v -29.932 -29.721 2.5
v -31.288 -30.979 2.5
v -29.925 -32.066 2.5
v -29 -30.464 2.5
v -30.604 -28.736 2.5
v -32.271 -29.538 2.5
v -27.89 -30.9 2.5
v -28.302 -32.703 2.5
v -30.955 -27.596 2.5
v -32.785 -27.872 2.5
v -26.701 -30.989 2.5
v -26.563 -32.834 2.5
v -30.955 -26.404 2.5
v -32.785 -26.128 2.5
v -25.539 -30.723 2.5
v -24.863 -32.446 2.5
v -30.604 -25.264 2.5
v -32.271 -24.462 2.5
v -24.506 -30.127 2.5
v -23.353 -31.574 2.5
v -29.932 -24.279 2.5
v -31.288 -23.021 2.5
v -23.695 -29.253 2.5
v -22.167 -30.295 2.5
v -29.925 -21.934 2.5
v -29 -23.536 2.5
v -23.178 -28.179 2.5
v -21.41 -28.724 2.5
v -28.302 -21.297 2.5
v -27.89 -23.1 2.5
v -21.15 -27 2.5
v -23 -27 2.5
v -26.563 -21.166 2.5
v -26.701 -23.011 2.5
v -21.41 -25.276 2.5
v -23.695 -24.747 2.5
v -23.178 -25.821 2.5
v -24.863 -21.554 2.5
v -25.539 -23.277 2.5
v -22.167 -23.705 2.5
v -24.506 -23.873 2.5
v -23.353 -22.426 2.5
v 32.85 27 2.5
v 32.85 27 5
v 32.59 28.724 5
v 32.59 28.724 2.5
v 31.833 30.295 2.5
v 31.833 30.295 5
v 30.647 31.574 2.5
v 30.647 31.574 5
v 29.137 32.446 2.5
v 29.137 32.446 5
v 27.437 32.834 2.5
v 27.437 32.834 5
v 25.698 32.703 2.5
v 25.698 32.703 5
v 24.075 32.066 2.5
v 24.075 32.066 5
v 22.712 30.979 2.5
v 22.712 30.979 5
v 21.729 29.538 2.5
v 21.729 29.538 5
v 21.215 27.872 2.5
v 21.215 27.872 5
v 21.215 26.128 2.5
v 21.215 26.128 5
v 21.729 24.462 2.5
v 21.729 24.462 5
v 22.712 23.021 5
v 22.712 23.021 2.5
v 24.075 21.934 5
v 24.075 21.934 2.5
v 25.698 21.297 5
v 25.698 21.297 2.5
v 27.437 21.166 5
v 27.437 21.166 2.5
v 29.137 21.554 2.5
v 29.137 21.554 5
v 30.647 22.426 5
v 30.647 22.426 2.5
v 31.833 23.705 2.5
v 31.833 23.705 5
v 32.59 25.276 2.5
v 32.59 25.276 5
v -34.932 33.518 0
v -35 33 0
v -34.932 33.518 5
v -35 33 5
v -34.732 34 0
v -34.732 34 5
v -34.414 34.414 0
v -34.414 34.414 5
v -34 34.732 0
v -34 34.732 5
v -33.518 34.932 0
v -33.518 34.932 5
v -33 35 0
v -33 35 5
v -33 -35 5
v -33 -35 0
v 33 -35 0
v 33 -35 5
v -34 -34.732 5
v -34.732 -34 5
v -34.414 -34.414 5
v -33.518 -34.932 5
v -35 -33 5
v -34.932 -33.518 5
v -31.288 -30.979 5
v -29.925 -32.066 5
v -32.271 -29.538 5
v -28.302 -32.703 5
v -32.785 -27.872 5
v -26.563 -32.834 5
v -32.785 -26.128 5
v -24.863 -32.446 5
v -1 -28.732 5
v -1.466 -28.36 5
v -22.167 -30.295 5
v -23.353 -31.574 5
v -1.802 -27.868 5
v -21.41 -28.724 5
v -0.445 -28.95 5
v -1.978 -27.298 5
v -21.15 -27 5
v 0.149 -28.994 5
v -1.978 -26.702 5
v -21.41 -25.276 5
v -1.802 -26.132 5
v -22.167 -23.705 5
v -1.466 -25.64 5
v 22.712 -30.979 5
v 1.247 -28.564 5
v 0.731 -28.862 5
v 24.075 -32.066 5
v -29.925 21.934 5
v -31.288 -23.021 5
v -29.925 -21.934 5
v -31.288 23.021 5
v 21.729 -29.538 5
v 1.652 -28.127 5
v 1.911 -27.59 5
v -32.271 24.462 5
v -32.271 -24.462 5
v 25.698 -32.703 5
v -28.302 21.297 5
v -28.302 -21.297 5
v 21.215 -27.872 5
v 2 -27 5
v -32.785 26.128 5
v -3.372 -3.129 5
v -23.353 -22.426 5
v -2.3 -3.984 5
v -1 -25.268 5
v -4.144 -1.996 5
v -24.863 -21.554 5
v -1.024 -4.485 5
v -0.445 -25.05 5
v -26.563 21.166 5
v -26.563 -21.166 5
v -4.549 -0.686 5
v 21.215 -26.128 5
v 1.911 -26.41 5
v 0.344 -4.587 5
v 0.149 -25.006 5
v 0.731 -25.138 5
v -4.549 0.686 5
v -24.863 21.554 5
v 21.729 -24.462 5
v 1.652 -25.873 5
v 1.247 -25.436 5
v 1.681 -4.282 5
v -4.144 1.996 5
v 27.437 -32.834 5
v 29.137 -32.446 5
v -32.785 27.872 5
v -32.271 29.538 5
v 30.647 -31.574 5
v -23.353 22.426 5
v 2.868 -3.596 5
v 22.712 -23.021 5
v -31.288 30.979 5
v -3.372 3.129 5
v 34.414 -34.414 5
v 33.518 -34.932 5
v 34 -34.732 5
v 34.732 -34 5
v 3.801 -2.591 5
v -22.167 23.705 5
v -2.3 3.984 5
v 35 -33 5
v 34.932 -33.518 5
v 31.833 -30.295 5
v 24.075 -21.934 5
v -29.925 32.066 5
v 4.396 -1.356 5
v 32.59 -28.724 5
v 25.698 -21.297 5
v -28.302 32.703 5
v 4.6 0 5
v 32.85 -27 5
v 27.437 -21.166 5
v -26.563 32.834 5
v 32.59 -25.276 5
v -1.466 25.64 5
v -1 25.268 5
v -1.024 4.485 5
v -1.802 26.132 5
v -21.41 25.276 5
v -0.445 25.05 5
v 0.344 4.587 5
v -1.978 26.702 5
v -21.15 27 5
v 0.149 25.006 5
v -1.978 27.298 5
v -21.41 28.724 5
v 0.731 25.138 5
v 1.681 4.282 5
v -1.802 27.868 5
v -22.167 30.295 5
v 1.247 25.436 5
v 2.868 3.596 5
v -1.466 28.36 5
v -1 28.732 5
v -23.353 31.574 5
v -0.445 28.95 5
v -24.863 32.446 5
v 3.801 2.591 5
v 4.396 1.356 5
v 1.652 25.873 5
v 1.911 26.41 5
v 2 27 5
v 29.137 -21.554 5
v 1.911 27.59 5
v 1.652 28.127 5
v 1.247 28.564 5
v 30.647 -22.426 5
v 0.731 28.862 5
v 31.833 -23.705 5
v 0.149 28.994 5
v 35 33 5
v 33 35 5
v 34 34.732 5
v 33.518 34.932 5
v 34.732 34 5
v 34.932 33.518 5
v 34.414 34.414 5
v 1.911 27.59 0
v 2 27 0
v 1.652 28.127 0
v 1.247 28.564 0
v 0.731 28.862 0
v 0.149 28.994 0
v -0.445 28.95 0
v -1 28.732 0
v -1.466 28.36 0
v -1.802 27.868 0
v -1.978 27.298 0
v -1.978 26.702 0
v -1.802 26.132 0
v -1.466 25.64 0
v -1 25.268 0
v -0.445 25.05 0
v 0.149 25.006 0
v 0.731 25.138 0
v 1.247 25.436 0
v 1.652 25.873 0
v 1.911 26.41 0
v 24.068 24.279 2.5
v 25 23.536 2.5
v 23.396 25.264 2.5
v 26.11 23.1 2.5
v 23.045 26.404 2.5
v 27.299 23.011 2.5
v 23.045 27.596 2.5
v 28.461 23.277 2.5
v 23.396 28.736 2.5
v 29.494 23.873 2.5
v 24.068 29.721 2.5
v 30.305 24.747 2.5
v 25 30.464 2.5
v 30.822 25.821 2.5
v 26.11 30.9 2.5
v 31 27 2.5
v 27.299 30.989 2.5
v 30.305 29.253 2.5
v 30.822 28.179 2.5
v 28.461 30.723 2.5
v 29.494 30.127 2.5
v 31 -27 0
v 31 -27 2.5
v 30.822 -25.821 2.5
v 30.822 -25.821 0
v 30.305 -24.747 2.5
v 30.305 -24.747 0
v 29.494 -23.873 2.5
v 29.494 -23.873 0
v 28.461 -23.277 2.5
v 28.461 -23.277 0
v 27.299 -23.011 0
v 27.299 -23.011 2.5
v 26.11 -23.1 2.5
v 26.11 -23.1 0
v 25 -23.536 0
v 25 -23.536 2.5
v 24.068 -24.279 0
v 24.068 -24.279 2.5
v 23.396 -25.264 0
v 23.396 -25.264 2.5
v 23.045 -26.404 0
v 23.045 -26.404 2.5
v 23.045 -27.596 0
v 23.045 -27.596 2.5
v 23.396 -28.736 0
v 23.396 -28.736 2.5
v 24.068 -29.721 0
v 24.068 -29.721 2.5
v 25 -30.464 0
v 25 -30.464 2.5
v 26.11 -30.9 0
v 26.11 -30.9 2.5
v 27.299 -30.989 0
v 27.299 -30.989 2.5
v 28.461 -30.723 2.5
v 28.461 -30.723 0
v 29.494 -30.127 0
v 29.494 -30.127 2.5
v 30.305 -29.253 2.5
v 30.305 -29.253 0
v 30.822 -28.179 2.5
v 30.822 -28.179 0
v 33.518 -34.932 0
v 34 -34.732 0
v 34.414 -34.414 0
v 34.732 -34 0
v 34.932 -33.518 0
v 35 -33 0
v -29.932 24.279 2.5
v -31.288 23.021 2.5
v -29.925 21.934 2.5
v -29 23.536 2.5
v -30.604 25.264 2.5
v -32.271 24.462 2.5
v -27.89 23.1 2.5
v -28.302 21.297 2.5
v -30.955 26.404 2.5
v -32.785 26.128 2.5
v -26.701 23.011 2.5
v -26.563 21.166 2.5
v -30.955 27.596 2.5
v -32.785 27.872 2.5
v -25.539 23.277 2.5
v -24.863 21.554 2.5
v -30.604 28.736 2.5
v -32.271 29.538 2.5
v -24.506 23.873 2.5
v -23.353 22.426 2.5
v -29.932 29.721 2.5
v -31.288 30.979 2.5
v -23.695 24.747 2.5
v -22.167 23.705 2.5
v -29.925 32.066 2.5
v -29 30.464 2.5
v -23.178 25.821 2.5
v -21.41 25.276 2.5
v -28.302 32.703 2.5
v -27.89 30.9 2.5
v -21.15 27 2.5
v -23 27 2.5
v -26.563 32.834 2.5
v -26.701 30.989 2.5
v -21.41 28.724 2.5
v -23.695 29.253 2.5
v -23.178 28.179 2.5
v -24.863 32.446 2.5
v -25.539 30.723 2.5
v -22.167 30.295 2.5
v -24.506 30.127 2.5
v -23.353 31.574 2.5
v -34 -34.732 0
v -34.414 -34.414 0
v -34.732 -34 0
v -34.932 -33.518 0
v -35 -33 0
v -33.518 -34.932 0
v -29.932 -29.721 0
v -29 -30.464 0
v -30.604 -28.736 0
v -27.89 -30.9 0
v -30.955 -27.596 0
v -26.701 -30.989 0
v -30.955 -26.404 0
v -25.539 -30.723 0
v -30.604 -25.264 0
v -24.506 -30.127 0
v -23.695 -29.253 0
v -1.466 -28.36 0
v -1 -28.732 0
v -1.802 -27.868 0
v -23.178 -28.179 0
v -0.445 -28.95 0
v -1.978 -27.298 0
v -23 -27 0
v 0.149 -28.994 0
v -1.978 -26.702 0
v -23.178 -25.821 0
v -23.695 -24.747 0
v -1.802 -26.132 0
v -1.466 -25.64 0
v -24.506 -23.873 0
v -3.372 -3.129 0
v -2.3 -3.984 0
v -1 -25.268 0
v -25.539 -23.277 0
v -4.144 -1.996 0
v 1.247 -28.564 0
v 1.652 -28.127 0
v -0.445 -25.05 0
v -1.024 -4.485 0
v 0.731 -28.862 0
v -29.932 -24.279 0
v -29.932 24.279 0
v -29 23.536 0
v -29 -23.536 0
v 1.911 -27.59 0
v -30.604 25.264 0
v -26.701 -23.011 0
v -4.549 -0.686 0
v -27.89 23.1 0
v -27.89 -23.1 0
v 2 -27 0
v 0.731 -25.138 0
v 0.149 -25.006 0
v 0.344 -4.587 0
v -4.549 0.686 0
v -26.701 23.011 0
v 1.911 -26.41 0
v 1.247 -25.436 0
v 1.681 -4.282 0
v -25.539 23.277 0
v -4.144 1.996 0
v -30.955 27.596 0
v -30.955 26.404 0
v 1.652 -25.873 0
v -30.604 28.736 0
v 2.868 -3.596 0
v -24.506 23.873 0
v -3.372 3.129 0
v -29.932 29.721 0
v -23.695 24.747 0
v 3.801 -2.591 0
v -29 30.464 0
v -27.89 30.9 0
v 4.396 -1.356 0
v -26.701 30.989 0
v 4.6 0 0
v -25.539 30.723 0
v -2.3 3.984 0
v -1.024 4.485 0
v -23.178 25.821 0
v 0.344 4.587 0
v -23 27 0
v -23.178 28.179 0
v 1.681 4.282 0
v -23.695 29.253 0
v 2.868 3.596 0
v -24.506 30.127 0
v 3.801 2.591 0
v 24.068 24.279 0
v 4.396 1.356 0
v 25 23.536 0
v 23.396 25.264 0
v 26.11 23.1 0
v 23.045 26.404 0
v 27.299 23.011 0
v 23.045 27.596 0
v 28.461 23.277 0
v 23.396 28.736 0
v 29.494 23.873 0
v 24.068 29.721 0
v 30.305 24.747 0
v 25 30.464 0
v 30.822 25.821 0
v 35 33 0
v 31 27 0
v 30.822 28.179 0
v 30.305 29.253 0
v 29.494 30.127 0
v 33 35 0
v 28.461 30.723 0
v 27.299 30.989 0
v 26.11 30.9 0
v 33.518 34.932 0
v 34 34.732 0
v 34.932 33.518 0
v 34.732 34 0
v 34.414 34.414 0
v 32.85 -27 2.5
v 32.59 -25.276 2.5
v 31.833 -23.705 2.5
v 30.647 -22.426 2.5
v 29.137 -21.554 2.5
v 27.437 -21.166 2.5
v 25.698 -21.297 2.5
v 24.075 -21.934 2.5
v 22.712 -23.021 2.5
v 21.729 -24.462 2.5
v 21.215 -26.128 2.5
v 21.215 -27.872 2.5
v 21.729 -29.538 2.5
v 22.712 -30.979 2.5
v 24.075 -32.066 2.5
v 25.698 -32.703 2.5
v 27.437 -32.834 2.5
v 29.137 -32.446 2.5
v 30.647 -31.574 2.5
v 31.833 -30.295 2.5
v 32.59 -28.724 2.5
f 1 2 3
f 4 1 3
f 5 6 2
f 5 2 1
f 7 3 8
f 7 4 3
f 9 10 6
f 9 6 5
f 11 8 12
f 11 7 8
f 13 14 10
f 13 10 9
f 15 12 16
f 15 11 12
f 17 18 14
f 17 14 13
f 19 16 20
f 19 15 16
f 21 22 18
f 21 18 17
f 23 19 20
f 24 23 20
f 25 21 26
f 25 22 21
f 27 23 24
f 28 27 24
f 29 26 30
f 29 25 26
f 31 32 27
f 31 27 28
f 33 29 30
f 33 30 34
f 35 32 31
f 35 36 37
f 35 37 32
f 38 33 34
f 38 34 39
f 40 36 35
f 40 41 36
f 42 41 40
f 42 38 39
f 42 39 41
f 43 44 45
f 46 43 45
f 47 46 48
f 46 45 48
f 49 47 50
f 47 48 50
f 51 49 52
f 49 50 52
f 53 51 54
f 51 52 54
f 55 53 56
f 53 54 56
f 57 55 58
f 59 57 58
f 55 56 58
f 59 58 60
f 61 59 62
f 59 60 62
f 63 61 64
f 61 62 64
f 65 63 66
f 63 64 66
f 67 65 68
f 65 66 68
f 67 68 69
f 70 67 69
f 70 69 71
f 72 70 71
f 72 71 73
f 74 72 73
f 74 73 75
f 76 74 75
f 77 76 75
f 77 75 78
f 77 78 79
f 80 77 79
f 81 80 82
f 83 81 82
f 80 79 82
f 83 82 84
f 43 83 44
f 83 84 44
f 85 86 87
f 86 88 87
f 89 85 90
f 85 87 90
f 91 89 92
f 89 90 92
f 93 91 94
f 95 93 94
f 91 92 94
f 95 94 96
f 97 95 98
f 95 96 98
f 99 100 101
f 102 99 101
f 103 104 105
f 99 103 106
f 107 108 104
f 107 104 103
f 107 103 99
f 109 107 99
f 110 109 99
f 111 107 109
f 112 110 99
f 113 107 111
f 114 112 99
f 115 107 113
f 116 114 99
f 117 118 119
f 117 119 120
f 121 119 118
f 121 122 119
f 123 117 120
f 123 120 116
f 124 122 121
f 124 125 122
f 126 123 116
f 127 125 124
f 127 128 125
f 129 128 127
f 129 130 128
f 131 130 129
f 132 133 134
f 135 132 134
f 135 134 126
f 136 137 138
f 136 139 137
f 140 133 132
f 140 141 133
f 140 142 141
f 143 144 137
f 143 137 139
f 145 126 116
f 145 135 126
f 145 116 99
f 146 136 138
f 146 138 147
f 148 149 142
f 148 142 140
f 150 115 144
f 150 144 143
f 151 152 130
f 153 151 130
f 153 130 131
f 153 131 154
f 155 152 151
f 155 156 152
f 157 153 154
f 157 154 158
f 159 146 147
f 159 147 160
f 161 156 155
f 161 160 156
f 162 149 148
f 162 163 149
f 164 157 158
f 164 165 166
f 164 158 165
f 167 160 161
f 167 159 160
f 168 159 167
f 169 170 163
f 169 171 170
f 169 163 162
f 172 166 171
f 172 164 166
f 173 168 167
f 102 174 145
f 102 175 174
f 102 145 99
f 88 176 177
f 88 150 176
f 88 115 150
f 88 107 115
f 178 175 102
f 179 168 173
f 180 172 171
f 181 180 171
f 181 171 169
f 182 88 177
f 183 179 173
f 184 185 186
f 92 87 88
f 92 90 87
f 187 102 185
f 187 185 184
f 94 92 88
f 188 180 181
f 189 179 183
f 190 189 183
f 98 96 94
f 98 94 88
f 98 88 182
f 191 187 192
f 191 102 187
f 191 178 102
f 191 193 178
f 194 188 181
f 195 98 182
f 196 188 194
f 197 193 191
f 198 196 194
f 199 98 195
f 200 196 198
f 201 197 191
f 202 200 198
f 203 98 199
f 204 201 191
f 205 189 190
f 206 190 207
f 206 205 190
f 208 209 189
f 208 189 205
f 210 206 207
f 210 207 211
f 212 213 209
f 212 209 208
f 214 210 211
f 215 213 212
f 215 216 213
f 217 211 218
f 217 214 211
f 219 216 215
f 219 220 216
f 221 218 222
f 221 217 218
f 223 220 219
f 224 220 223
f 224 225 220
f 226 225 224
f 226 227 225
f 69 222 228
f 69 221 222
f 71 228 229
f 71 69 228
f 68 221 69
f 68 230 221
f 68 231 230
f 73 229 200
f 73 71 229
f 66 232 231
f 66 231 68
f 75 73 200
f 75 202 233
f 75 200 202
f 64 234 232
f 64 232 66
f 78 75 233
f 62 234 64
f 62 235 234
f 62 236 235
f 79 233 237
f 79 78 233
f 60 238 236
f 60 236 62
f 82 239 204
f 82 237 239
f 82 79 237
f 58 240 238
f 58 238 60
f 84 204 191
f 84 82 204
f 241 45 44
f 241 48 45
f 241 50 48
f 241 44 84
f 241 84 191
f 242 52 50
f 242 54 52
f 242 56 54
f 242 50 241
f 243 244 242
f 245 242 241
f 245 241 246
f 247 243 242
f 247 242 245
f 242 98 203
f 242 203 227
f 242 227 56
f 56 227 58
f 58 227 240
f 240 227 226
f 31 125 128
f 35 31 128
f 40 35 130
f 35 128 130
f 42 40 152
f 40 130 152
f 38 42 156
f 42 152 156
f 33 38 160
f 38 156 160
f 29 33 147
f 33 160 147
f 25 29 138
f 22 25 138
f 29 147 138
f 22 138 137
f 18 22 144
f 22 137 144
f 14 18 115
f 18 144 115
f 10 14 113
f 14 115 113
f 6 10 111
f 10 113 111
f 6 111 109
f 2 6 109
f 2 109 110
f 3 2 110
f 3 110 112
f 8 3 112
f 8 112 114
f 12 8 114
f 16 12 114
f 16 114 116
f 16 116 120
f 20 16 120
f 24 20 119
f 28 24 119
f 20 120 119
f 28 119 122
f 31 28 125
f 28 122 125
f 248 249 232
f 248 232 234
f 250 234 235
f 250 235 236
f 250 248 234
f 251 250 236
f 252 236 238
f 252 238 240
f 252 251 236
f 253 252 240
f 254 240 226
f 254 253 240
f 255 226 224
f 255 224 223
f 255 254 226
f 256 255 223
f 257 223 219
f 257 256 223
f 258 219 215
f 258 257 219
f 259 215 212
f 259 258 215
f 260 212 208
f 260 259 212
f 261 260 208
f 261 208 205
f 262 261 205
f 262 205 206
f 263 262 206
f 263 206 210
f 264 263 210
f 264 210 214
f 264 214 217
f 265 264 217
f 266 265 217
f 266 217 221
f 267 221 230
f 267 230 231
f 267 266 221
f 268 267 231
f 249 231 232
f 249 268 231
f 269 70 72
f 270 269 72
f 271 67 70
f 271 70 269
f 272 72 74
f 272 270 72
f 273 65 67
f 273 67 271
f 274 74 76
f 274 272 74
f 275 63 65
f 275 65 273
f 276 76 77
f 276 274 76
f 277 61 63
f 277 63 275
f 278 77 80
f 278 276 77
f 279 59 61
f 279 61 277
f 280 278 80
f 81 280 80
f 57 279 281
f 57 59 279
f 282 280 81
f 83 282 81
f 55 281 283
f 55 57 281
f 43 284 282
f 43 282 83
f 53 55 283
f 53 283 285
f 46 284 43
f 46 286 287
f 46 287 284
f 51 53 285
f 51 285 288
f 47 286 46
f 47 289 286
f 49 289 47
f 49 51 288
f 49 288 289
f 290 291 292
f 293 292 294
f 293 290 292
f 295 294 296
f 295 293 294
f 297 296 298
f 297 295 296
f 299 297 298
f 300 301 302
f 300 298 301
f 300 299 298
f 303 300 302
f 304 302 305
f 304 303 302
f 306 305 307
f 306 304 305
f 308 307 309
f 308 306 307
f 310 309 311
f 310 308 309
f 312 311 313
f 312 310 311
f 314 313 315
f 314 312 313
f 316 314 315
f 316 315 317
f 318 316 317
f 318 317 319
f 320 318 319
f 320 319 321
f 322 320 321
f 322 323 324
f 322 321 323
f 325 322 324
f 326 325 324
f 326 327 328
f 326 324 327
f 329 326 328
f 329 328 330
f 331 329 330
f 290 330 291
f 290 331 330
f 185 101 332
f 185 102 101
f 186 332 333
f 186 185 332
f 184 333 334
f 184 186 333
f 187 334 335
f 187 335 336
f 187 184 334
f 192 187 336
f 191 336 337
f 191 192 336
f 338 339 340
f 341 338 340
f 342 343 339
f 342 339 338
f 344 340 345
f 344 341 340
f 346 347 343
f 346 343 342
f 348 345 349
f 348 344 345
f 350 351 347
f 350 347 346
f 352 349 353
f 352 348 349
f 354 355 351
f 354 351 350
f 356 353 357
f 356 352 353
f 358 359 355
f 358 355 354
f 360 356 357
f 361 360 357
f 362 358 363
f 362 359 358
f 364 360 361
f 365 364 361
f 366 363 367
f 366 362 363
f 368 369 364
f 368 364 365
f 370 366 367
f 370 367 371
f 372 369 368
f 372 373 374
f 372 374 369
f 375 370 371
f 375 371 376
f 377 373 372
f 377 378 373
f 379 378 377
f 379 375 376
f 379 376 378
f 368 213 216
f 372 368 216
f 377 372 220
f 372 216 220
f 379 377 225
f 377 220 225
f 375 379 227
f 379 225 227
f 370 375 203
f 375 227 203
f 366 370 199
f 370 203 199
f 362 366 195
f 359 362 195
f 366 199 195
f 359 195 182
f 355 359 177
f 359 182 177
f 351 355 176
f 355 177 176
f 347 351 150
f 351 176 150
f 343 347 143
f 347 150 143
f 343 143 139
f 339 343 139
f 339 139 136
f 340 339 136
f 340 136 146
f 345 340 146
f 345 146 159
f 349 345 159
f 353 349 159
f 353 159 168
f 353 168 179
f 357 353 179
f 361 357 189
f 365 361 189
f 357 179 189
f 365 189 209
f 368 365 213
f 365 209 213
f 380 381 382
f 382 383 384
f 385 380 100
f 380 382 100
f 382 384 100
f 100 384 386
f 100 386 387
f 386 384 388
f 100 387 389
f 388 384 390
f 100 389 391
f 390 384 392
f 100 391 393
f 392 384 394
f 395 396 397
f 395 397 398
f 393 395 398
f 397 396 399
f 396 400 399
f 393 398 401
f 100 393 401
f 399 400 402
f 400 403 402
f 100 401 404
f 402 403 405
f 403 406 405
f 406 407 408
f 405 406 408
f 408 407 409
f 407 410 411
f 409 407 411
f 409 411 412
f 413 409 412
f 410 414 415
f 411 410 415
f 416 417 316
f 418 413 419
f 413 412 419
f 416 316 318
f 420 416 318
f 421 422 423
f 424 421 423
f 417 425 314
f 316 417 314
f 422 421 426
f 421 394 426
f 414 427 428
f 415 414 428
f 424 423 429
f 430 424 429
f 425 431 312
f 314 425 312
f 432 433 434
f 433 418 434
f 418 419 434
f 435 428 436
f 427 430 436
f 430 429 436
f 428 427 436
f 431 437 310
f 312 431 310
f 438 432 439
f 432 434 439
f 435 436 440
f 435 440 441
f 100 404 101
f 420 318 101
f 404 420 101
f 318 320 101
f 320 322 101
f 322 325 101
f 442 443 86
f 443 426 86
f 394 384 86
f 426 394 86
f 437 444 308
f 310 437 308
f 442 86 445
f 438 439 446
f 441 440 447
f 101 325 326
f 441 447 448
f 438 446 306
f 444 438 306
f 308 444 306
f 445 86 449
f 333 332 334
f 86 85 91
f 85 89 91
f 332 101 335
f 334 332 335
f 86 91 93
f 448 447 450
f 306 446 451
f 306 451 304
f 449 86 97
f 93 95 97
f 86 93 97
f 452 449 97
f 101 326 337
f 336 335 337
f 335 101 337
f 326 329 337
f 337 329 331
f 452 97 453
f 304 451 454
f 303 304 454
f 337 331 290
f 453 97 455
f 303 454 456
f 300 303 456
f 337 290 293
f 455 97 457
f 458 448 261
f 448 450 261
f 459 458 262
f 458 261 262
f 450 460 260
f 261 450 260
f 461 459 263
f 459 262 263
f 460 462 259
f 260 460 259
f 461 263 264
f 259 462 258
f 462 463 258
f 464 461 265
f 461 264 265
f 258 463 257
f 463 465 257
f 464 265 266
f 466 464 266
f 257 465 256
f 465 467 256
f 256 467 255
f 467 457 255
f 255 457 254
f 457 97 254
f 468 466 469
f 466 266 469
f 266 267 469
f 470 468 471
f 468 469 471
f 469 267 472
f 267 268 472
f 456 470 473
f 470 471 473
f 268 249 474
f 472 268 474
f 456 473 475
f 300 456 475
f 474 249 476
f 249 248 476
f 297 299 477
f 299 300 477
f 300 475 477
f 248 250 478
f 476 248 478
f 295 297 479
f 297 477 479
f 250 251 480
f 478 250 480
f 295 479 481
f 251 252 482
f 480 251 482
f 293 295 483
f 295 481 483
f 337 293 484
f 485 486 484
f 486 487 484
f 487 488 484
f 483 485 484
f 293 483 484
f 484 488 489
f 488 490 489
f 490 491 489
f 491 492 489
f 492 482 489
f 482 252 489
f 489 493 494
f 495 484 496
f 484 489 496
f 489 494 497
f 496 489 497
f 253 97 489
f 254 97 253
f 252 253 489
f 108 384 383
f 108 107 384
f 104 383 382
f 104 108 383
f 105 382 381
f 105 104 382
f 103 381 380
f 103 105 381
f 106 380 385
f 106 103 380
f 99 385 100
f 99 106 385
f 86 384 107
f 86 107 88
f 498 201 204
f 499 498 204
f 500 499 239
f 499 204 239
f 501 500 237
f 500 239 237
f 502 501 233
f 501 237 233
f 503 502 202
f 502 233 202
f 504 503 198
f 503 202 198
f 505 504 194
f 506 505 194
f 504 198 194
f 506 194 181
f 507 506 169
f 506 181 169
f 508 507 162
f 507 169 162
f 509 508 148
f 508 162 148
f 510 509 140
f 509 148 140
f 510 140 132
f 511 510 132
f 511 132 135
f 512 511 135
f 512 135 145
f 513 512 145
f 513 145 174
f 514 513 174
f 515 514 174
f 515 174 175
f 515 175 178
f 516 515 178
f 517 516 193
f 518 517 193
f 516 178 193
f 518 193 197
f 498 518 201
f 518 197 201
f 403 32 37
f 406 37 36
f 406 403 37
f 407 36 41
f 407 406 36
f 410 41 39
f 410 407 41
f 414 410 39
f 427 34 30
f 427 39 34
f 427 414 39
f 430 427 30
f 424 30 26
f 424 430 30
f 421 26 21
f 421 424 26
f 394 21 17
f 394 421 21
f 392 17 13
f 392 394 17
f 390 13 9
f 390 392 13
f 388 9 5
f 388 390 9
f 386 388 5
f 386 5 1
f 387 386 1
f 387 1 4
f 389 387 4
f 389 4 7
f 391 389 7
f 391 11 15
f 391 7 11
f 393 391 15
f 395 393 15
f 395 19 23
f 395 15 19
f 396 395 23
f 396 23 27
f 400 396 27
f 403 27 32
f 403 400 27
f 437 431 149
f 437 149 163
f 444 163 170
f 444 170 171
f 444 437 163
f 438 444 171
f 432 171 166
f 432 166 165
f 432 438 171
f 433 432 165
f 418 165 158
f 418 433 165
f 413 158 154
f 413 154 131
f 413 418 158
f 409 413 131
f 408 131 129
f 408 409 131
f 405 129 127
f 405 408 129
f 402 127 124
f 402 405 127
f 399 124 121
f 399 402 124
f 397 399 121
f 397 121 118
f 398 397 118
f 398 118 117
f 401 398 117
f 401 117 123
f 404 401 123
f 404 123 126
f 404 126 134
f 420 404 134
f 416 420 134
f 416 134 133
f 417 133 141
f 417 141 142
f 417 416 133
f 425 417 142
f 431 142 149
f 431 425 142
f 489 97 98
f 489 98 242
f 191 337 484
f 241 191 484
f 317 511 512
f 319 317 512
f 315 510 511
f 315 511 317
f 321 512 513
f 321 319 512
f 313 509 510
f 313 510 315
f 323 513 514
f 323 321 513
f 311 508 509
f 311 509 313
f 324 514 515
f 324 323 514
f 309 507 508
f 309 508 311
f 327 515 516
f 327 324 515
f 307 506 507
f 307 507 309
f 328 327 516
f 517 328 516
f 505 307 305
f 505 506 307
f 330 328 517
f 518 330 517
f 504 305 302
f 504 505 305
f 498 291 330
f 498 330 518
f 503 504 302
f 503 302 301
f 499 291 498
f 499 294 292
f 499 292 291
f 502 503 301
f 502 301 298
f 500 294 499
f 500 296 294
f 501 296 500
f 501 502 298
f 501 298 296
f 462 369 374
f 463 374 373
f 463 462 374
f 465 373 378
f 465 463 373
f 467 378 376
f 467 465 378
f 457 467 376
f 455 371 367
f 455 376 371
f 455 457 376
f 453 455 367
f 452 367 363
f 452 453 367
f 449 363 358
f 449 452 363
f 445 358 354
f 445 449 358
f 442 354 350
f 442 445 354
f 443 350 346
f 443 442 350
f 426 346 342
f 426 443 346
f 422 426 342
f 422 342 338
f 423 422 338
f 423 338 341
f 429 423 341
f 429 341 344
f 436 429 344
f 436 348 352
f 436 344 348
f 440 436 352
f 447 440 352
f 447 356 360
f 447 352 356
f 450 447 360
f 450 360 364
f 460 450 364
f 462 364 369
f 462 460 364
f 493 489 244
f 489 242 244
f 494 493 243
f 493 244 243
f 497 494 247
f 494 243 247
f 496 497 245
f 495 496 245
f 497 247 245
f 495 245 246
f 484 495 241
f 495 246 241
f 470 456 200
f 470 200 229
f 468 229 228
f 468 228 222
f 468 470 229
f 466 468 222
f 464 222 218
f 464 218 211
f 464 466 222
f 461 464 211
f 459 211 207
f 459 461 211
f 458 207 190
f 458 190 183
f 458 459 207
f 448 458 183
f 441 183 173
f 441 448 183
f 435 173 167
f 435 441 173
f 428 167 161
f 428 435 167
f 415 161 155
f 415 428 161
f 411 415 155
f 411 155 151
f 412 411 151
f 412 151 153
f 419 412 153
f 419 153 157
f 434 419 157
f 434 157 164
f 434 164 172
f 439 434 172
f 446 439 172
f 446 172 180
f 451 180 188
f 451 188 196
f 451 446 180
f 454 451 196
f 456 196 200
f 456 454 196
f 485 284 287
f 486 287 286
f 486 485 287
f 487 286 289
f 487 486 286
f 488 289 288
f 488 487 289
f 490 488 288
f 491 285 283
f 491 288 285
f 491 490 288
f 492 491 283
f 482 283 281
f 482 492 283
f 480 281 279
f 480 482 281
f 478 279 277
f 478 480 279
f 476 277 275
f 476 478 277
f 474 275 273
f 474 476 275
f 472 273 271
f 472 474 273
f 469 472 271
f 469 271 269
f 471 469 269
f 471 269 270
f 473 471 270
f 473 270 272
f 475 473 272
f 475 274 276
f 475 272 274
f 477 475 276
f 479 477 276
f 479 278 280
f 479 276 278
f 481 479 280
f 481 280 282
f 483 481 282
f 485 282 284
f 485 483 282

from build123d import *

# Parameters (mm, degrees)
SKETCH1_W           = 70
SKETCH1_H           = 70
SKETCH1_R           = 4.6
SKETCH1_R_2         = 2
SKETCH1_R_3         = 4
BOSS_EXTRUDE1_DEPTH = 5
FILLET1_R           = 2
FILLET2_R           = 2
SKETCH2_R           = 5.85
CUT_EXTRUDE1_DEPTH  = 2.5


with BuildPart() as part:
    # Sketch1 → Boss-Extrude1 (new body)
    with BuildSketch(Plane.XY):
        Rectangle(SKETCH1_W, SKETCH1_H)
        Circle(SKETCH1_R, mode=Mode.SUBTRACT)
        with Locations((0, 27)):
            Circle(SKETCH1_R_2, mode=Mode.SUBTRACT)
        with Locations((0, -27)):
            Circle(SKETCH1_R_2, mode=Mode.SUBTRACT)
        with Locations((-27, 27)):
            Circle(SKETCH1_R_3, mode=Mode.SUBTRACT)
        with Locations((27, 27)):
            Circle(SKETCH1_R_3, mode=Mode.SUBTRACT)
        with Locations((27, -27)):
            Circle(SKETCH1_R_3, mode=Mode.SUBTRACT)
        with Locations((-27, -27)):
            Circle(SKETCH1_R_3, mode=Mode.SUBTRACT)
    extrude(amount=BOSS_EXTRUDE1_DEPTH)

    # Fillet1
    fillet1_edges = [part.edges().sort_by_distance(p)[0] for p in [
        (-35, 35, 2.5),
        (35, 35, 2.5),
        (35, -35, 2.5),
    ]]
    fillet(fillet1_edges, radius=FILLET1_R)

    # Fillet2
    fillet2_edges = [part.edges().sort_by_distance(p)[0] for p in [
        (-35, -35, 2.5),
    ]]
    fillet(fillet2_edges, radius=FILLET2_R)

    # Sketch2 → Cut-Extrude1 (cut)
    with BuildSketch(Plane.XY.offset(5)):
        with Locations((-27, 27)):
            Circle(SKETCH2_R)
        with Locations((27, 27)):
            Circle(SKETCH2_R)
        with Locations((27, -27)):
            Circle(SKETCH2_R)
        with Locations((-27, -27)):
            Circle(SKETCH2_R)
    extrude(amount=-CUT_EXTRUDE1_DEPTH, mode=Mode.SUBTRACT)


solid = part.part
